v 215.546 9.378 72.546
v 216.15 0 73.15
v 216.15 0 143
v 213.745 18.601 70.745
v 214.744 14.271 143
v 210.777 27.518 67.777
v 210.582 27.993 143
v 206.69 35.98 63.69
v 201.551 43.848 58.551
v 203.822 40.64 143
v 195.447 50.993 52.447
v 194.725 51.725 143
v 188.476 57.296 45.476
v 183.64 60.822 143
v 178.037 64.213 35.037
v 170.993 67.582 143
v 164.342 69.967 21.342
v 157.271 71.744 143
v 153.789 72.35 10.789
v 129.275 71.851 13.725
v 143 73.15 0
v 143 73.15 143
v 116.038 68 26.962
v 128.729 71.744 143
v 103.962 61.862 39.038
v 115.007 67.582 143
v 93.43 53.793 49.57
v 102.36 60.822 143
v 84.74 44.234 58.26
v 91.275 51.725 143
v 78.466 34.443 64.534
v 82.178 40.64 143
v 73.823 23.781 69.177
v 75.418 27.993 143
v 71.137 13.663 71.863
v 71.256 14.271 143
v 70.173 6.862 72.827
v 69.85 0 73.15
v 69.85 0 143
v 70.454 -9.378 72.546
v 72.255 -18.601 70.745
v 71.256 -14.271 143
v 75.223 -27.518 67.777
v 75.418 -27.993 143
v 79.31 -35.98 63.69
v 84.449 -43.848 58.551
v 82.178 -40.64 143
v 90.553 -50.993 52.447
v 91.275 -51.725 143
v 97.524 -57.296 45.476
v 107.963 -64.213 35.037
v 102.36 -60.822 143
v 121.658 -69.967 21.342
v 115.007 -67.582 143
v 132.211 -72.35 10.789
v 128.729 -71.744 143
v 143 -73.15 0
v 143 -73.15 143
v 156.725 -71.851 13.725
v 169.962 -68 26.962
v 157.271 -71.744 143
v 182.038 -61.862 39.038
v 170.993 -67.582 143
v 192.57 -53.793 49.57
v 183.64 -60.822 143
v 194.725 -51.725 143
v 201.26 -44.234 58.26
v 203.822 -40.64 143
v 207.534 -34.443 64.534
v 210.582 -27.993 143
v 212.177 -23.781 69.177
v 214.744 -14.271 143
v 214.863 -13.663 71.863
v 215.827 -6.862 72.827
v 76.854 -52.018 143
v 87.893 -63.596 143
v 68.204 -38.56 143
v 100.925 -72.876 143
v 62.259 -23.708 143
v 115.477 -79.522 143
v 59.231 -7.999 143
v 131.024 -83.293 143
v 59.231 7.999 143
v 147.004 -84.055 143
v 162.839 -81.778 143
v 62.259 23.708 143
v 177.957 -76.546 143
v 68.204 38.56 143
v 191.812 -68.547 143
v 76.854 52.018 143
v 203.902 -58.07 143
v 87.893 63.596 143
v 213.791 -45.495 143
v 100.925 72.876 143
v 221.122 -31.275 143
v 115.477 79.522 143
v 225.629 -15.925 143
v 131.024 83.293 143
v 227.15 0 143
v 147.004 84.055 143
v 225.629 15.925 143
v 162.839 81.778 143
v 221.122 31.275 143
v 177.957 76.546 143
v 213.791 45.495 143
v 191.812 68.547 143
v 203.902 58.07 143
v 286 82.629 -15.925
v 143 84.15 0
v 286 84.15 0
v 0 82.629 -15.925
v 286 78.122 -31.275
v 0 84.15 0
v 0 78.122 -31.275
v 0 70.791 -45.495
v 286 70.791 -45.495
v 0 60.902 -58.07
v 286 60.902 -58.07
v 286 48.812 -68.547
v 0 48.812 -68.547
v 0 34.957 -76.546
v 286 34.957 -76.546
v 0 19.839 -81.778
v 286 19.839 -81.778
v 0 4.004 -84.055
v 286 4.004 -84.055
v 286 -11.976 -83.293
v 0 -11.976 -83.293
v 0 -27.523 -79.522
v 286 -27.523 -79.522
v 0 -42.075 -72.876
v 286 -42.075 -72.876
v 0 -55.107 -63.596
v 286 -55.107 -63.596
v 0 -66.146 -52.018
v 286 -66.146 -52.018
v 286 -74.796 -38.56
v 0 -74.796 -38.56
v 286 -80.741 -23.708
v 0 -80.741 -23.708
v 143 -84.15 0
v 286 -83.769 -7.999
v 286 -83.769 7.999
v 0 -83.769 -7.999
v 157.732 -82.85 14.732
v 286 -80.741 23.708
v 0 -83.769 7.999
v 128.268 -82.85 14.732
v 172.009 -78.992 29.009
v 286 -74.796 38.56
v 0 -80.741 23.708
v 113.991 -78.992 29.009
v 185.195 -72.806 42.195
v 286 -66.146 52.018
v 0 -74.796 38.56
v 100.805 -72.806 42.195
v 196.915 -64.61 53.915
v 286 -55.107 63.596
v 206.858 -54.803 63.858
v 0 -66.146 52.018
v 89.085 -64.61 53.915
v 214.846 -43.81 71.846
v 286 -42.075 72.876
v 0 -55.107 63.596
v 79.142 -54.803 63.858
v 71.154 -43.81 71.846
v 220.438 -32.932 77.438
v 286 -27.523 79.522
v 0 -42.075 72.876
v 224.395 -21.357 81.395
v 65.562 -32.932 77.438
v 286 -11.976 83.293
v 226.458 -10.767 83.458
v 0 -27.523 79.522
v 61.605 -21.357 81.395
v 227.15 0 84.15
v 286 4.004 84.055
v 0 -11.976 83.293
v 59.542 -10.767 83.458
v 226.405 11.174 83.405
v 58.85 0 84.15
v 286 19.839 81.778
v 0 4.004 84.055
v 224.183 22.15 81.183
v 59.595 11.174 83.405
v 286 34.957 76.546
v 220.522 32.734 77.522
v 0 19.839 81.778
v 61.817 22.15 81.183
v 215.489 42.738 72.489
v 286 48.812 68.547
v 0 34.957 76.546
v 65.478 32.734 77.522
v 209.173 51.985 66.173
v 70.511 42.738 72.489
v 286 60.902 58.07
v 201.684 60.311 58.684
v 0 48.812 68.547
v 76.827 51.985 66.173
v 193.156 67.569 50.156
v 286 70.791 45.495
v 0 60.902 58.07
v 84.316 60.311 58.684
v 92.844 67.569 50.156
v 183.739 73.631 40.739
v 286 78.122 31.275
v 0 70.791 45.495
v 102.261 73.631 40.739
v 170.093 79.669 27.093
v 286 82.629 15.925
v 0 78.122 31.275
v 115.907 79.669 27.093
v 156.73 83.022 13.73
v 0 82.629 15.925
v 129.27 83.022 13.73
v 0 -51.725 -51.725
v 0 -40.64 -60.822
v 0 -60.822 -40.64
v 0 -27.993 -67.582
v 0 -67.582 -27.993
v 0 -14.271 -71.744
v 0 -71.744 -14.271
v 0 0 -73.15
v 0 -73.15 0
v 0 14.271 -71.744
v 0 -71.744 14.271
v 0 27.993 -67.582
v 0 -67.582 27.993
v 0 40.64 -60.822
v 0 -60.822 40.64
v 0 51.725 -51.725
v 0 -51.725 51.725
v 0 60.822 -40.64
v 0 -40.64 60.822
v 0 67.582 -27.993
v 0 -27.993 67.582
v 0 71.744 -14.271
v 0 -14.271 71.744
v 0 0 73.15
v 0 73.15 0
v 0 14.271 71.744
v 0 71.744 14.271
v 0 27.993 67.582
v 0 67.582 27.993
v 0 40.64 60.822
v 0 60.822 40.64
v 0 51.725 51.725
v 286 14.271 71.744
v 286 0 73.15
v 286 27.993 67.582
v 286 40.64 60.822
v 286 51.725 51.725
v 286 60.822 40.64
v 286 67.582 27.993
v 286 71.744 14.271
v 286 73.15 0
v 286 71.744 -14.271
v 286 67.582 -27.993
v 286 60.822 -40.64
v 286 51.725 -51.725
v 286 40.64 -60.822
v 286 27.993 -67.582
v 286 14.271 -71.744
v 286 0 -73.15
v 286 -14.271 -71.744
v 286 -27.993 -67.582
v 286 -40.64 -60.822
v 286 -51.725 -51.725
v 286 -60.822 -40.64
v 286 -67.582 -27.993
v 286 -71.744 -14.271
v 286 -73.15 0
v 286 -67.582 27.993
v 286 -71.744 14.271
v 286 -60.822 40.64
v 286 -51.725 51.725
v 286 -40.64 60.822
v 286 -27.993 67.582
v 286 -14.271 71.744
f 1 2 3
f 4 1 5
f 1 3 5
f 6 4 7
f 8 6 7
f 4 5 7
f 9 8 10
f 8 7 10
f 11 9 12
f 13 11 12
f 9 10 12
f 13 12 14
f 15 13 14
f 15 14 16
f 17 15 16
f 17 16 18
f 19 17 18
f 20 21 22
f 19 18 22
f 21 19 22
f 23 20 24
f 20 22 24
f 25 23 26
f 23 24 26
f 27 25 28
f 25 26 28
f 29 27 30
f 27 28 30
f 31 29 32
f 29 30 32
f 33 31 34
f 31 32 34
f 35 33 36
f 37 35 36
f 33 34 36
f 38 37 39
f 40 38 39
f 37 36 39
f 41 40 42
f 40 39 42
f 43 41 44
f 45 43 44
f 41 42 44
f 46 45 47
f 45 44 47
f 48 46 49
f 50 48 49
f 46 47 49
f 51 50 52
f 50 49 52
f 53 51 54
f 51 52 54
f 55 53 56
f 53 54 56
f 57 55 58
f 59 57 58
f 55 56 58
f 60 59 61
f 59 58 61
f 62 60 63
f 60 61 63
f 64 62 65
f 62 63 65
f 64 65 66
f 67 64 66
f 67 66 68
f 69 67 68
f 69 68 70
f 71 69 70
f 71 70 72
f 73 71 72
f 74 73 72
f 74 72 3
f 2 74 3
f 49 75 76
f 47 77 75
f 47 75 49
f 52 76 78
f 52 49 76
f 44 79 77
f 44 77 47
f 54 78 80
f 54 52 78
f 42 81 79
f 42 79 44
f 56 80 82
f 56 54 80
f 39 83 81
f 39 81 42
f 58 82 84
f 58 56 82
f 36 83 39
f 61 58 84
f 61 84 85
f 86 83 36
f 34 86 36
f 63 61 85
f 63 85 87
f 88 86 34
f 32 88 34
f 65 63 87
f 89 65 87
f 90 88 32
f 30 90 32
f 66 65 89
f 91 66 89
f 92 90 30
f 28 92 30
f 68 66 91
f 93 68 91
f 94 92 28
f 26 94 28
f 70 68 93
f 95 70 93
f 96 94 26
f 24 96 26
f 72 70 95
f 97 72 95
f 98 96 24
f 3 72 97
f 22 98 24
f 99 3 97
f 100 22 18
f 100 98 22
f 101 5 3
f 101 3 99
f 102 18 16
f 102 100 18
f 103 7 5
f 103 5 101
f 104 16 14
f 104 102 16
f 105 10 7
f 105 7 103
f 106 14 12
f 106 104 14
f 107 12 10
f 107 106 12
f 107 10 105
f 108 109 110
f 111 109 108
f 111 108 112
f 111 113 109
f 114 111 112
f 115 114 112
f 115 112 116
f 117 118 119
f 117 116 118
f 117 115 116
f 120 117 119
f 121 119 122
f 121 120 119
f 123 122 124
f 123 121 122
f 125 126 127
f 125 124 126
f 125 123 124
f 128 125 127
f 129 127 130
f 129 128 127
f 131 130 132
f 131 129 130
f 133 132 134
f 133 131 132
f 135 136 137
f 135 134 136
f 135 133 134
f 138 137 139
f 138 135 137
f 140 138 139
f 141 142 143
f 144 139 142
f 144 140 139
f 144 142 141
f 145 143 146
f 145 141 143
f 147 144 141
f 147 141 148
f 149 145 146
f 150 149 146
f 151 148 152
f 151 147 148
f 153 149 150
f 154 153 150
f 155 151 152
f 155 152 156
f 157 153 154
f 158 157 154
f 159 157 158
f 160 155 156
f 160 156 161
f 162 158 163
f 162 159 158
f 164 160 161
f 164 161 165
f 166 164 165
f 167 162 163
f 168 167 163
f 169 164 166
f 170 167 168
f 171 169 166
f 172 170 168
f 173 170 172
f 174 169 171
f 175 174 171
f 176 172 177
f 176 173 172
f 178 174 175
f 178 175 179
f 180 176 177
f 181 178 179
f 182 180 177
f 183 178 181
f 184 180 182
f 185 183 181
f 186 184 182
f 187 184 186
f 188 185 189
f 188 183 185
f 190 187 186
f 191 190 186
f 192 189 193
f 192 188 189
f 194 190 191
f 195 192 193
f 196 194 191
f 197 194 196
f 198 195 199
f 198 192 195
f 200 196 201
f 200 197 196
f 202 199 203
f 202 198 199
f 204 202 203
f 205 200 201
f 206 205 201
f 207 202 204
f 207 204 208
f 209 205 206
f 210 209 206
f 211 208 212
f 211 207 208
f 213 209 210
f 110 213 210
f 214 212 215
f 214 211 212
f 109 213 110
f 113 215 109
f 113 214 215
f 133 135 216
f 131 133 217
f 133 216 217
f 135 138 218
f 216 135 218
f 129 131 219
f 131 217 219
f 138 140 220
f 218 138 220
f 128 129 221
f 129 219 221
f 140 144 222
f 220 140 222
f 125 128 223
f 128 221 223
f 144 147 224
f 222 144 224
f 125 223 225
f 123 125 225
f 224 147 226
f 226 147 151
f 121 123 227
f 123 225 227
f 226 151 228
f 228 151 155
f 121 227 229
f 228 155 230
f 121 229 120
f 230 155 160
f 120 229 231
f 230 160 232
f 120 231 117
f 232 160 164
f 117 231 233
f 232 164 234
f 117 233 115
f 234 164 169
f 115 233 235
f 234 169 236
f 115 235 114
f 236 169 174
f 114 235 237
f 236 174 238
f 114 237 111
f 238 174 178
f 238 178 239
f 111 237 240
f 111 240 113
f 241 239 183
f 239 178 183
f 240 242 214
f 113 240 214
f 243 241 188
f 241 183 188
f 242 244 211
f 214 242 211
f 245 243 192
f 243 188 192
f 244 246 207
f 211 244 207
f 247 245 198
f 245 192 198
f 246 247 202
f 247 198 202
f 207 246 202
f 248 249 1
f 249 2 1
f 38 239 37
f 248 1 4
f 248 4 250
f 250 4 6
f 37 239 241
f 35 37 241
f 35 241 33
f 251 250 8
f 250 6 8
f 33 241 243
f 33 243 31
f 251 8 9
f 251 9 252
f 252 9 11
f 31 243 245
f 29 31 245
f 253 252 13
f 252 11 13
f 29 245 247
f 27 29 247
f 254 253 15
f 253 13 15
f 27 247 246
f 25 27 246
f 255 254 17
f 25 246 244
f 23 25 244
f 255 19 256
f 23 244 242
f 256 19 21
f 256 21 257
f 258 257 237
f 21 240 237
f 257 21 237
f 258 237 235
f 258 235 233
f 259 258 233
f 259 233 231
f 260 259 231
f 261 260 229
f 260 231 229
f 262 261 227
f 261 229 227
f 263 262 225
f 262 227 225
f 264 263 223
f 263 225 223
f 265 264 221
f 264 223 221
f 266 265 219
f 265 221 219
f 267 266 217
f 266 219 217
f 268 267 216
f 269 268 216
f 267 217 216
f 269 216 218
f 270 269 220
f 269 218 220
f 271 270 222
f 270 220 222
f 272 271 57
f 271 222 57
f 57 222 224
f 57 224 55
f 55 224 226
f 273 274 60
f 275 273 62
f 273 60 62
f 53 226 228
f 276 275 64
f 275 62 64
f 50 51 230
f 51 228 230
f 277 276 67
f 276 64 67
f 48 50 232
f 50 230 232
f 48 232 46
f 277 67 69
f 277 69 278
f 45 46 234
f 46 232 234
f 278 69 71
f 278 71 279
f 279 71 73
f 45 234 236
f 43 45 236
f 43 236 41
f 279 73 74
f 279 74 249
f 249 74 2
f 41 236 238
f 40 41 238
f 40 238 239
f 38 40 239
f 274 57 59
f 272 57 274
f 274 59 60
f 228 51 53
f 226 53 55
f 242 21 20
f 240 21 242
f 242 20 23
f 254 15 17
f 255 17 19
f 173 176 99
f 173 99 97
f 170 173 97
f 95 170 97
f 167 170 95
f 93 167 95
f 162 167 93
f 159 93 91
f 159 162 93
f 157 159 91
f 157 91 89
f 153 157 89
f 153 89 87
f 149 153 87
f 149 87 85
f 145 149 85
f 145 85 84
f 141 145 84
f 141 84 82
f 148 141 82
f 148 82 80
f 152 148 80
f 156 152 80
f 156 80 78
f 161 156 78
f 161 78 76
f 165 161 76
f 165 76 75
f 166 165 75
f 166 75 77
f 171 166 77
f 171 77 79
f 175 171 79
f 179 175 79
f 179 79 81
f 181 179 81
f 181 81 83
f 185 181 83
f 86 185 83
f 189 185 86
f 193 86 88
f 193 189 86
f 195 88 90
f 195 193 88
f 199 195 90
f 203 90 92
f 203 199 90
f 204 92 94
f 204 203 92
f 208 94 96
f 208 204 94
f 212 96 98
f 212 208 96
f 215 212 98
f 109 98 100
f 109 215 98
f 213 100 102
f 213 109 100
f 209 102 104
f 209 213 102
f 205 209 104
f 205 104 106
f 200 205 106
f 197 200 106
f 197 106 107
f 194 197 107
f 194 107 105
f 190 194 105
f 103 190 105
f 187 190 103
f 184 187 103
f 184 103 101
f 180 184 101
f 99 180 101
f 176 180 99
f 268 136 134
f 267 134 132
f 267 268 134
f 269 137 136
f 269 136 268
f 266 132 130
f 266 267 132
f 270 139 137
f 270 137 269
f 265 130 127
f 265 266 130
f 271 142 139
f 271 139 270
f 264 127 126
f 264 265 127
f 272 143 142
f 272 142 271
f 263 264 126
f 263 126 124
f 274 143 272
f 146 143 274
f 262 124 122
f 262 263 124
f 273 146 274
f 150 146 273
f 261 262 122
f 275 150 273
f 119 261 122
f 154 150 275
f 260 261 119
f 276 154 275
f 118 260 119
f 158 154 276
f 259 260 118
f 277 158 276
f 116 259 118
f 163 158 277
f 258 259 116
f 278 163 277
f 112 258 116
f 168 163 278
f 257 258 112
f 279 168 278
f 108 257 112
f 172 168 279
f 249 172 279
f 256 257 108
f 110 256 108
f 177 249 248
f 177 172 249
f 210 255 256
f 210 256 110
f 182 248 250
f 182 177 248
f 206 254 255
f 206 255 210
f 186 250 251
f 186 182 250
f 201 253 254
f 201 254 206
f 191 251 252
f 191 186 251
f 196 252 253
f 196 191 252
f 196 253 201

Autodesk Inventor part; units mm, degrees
ref_plane "YZ Plane" through (0, 0, 0) normal (1, 0, 0) x (0, 1, 0)
ref_plane "XZ Plane" through (0, 0, 0) normal (0, 1, 0) x (-1, 0, 0)
ref_plane "XY Plane" through (0, 0, 0) normal (0, 0, 1) x (1, 0, 0)
sketch "Sketch1" plane through (0, 0, 0) normal (1, 0, 0) x (0, 1, 0)
  circle A0 centre (0, 0) radius 84.15
  dimension "d0" = 168.3
extrude "Extrude1" add sketch "Sketch1" along normal blind 286
sketch "Sketch2" plane through (0, 0, 0) normal (0, 0, 1) x (1, 0, 0)
  line L0 (0, 84.15) -> (0, -84.15) projected
  line L1 (286, 84.15) -> (286, -84.15) projected
  line L2 (0, 0) -> (286, 0) construction
  circle A0 centre (143, 0) radius 84.15
  dimension "d3" = 168.3
extrude "Extrude2" add sketch "Sketch2" along normal blind 143
sketch "Sketch3" plane through (0, 0, 0) normal (-1, 0, 0) x (0, 0, 1)
  circle A0 centre (0, 0) radius 84.15 projected
  circle A1 centre (0, 0) radius 73.15
  dimension "d6" = 146.3
extrude "Extrude3" cut sketch "Sketch3" against normal through all contours A1
sketch "Sketch4" plane through (143, 0, 143) normal (0, 0, 1) x (1, 0, 0)
  circle A0 centre (0, 0) radius 84.15 projected
  circle A1 centre (0, 0) radius 73.15
  dimension "d9" = 146.3
extrude "Extrude4" cut sketch "Sketch4" against normal up to next contours A1
equation "\"d0\" = d"
equation "\"d1\" = 2 * a"
equation "\"d3\" = d"
equation "\"d4\" = a"
equation "\"d6\" = d - 2 * s1"
equation "\"d7\" = a"
equation "\"d9\" = d - 2 * s1"
equation "\"d10\" = a"
equation "\"d\" = 168.3"
equation "\"s1\" = 11"
equation "\"a\" = 143"
equation "\"Size_Designation\" = 1.2345"
properties part number "DIN 2615-1 Tee 168.3 x 11 S" material "Steel"
